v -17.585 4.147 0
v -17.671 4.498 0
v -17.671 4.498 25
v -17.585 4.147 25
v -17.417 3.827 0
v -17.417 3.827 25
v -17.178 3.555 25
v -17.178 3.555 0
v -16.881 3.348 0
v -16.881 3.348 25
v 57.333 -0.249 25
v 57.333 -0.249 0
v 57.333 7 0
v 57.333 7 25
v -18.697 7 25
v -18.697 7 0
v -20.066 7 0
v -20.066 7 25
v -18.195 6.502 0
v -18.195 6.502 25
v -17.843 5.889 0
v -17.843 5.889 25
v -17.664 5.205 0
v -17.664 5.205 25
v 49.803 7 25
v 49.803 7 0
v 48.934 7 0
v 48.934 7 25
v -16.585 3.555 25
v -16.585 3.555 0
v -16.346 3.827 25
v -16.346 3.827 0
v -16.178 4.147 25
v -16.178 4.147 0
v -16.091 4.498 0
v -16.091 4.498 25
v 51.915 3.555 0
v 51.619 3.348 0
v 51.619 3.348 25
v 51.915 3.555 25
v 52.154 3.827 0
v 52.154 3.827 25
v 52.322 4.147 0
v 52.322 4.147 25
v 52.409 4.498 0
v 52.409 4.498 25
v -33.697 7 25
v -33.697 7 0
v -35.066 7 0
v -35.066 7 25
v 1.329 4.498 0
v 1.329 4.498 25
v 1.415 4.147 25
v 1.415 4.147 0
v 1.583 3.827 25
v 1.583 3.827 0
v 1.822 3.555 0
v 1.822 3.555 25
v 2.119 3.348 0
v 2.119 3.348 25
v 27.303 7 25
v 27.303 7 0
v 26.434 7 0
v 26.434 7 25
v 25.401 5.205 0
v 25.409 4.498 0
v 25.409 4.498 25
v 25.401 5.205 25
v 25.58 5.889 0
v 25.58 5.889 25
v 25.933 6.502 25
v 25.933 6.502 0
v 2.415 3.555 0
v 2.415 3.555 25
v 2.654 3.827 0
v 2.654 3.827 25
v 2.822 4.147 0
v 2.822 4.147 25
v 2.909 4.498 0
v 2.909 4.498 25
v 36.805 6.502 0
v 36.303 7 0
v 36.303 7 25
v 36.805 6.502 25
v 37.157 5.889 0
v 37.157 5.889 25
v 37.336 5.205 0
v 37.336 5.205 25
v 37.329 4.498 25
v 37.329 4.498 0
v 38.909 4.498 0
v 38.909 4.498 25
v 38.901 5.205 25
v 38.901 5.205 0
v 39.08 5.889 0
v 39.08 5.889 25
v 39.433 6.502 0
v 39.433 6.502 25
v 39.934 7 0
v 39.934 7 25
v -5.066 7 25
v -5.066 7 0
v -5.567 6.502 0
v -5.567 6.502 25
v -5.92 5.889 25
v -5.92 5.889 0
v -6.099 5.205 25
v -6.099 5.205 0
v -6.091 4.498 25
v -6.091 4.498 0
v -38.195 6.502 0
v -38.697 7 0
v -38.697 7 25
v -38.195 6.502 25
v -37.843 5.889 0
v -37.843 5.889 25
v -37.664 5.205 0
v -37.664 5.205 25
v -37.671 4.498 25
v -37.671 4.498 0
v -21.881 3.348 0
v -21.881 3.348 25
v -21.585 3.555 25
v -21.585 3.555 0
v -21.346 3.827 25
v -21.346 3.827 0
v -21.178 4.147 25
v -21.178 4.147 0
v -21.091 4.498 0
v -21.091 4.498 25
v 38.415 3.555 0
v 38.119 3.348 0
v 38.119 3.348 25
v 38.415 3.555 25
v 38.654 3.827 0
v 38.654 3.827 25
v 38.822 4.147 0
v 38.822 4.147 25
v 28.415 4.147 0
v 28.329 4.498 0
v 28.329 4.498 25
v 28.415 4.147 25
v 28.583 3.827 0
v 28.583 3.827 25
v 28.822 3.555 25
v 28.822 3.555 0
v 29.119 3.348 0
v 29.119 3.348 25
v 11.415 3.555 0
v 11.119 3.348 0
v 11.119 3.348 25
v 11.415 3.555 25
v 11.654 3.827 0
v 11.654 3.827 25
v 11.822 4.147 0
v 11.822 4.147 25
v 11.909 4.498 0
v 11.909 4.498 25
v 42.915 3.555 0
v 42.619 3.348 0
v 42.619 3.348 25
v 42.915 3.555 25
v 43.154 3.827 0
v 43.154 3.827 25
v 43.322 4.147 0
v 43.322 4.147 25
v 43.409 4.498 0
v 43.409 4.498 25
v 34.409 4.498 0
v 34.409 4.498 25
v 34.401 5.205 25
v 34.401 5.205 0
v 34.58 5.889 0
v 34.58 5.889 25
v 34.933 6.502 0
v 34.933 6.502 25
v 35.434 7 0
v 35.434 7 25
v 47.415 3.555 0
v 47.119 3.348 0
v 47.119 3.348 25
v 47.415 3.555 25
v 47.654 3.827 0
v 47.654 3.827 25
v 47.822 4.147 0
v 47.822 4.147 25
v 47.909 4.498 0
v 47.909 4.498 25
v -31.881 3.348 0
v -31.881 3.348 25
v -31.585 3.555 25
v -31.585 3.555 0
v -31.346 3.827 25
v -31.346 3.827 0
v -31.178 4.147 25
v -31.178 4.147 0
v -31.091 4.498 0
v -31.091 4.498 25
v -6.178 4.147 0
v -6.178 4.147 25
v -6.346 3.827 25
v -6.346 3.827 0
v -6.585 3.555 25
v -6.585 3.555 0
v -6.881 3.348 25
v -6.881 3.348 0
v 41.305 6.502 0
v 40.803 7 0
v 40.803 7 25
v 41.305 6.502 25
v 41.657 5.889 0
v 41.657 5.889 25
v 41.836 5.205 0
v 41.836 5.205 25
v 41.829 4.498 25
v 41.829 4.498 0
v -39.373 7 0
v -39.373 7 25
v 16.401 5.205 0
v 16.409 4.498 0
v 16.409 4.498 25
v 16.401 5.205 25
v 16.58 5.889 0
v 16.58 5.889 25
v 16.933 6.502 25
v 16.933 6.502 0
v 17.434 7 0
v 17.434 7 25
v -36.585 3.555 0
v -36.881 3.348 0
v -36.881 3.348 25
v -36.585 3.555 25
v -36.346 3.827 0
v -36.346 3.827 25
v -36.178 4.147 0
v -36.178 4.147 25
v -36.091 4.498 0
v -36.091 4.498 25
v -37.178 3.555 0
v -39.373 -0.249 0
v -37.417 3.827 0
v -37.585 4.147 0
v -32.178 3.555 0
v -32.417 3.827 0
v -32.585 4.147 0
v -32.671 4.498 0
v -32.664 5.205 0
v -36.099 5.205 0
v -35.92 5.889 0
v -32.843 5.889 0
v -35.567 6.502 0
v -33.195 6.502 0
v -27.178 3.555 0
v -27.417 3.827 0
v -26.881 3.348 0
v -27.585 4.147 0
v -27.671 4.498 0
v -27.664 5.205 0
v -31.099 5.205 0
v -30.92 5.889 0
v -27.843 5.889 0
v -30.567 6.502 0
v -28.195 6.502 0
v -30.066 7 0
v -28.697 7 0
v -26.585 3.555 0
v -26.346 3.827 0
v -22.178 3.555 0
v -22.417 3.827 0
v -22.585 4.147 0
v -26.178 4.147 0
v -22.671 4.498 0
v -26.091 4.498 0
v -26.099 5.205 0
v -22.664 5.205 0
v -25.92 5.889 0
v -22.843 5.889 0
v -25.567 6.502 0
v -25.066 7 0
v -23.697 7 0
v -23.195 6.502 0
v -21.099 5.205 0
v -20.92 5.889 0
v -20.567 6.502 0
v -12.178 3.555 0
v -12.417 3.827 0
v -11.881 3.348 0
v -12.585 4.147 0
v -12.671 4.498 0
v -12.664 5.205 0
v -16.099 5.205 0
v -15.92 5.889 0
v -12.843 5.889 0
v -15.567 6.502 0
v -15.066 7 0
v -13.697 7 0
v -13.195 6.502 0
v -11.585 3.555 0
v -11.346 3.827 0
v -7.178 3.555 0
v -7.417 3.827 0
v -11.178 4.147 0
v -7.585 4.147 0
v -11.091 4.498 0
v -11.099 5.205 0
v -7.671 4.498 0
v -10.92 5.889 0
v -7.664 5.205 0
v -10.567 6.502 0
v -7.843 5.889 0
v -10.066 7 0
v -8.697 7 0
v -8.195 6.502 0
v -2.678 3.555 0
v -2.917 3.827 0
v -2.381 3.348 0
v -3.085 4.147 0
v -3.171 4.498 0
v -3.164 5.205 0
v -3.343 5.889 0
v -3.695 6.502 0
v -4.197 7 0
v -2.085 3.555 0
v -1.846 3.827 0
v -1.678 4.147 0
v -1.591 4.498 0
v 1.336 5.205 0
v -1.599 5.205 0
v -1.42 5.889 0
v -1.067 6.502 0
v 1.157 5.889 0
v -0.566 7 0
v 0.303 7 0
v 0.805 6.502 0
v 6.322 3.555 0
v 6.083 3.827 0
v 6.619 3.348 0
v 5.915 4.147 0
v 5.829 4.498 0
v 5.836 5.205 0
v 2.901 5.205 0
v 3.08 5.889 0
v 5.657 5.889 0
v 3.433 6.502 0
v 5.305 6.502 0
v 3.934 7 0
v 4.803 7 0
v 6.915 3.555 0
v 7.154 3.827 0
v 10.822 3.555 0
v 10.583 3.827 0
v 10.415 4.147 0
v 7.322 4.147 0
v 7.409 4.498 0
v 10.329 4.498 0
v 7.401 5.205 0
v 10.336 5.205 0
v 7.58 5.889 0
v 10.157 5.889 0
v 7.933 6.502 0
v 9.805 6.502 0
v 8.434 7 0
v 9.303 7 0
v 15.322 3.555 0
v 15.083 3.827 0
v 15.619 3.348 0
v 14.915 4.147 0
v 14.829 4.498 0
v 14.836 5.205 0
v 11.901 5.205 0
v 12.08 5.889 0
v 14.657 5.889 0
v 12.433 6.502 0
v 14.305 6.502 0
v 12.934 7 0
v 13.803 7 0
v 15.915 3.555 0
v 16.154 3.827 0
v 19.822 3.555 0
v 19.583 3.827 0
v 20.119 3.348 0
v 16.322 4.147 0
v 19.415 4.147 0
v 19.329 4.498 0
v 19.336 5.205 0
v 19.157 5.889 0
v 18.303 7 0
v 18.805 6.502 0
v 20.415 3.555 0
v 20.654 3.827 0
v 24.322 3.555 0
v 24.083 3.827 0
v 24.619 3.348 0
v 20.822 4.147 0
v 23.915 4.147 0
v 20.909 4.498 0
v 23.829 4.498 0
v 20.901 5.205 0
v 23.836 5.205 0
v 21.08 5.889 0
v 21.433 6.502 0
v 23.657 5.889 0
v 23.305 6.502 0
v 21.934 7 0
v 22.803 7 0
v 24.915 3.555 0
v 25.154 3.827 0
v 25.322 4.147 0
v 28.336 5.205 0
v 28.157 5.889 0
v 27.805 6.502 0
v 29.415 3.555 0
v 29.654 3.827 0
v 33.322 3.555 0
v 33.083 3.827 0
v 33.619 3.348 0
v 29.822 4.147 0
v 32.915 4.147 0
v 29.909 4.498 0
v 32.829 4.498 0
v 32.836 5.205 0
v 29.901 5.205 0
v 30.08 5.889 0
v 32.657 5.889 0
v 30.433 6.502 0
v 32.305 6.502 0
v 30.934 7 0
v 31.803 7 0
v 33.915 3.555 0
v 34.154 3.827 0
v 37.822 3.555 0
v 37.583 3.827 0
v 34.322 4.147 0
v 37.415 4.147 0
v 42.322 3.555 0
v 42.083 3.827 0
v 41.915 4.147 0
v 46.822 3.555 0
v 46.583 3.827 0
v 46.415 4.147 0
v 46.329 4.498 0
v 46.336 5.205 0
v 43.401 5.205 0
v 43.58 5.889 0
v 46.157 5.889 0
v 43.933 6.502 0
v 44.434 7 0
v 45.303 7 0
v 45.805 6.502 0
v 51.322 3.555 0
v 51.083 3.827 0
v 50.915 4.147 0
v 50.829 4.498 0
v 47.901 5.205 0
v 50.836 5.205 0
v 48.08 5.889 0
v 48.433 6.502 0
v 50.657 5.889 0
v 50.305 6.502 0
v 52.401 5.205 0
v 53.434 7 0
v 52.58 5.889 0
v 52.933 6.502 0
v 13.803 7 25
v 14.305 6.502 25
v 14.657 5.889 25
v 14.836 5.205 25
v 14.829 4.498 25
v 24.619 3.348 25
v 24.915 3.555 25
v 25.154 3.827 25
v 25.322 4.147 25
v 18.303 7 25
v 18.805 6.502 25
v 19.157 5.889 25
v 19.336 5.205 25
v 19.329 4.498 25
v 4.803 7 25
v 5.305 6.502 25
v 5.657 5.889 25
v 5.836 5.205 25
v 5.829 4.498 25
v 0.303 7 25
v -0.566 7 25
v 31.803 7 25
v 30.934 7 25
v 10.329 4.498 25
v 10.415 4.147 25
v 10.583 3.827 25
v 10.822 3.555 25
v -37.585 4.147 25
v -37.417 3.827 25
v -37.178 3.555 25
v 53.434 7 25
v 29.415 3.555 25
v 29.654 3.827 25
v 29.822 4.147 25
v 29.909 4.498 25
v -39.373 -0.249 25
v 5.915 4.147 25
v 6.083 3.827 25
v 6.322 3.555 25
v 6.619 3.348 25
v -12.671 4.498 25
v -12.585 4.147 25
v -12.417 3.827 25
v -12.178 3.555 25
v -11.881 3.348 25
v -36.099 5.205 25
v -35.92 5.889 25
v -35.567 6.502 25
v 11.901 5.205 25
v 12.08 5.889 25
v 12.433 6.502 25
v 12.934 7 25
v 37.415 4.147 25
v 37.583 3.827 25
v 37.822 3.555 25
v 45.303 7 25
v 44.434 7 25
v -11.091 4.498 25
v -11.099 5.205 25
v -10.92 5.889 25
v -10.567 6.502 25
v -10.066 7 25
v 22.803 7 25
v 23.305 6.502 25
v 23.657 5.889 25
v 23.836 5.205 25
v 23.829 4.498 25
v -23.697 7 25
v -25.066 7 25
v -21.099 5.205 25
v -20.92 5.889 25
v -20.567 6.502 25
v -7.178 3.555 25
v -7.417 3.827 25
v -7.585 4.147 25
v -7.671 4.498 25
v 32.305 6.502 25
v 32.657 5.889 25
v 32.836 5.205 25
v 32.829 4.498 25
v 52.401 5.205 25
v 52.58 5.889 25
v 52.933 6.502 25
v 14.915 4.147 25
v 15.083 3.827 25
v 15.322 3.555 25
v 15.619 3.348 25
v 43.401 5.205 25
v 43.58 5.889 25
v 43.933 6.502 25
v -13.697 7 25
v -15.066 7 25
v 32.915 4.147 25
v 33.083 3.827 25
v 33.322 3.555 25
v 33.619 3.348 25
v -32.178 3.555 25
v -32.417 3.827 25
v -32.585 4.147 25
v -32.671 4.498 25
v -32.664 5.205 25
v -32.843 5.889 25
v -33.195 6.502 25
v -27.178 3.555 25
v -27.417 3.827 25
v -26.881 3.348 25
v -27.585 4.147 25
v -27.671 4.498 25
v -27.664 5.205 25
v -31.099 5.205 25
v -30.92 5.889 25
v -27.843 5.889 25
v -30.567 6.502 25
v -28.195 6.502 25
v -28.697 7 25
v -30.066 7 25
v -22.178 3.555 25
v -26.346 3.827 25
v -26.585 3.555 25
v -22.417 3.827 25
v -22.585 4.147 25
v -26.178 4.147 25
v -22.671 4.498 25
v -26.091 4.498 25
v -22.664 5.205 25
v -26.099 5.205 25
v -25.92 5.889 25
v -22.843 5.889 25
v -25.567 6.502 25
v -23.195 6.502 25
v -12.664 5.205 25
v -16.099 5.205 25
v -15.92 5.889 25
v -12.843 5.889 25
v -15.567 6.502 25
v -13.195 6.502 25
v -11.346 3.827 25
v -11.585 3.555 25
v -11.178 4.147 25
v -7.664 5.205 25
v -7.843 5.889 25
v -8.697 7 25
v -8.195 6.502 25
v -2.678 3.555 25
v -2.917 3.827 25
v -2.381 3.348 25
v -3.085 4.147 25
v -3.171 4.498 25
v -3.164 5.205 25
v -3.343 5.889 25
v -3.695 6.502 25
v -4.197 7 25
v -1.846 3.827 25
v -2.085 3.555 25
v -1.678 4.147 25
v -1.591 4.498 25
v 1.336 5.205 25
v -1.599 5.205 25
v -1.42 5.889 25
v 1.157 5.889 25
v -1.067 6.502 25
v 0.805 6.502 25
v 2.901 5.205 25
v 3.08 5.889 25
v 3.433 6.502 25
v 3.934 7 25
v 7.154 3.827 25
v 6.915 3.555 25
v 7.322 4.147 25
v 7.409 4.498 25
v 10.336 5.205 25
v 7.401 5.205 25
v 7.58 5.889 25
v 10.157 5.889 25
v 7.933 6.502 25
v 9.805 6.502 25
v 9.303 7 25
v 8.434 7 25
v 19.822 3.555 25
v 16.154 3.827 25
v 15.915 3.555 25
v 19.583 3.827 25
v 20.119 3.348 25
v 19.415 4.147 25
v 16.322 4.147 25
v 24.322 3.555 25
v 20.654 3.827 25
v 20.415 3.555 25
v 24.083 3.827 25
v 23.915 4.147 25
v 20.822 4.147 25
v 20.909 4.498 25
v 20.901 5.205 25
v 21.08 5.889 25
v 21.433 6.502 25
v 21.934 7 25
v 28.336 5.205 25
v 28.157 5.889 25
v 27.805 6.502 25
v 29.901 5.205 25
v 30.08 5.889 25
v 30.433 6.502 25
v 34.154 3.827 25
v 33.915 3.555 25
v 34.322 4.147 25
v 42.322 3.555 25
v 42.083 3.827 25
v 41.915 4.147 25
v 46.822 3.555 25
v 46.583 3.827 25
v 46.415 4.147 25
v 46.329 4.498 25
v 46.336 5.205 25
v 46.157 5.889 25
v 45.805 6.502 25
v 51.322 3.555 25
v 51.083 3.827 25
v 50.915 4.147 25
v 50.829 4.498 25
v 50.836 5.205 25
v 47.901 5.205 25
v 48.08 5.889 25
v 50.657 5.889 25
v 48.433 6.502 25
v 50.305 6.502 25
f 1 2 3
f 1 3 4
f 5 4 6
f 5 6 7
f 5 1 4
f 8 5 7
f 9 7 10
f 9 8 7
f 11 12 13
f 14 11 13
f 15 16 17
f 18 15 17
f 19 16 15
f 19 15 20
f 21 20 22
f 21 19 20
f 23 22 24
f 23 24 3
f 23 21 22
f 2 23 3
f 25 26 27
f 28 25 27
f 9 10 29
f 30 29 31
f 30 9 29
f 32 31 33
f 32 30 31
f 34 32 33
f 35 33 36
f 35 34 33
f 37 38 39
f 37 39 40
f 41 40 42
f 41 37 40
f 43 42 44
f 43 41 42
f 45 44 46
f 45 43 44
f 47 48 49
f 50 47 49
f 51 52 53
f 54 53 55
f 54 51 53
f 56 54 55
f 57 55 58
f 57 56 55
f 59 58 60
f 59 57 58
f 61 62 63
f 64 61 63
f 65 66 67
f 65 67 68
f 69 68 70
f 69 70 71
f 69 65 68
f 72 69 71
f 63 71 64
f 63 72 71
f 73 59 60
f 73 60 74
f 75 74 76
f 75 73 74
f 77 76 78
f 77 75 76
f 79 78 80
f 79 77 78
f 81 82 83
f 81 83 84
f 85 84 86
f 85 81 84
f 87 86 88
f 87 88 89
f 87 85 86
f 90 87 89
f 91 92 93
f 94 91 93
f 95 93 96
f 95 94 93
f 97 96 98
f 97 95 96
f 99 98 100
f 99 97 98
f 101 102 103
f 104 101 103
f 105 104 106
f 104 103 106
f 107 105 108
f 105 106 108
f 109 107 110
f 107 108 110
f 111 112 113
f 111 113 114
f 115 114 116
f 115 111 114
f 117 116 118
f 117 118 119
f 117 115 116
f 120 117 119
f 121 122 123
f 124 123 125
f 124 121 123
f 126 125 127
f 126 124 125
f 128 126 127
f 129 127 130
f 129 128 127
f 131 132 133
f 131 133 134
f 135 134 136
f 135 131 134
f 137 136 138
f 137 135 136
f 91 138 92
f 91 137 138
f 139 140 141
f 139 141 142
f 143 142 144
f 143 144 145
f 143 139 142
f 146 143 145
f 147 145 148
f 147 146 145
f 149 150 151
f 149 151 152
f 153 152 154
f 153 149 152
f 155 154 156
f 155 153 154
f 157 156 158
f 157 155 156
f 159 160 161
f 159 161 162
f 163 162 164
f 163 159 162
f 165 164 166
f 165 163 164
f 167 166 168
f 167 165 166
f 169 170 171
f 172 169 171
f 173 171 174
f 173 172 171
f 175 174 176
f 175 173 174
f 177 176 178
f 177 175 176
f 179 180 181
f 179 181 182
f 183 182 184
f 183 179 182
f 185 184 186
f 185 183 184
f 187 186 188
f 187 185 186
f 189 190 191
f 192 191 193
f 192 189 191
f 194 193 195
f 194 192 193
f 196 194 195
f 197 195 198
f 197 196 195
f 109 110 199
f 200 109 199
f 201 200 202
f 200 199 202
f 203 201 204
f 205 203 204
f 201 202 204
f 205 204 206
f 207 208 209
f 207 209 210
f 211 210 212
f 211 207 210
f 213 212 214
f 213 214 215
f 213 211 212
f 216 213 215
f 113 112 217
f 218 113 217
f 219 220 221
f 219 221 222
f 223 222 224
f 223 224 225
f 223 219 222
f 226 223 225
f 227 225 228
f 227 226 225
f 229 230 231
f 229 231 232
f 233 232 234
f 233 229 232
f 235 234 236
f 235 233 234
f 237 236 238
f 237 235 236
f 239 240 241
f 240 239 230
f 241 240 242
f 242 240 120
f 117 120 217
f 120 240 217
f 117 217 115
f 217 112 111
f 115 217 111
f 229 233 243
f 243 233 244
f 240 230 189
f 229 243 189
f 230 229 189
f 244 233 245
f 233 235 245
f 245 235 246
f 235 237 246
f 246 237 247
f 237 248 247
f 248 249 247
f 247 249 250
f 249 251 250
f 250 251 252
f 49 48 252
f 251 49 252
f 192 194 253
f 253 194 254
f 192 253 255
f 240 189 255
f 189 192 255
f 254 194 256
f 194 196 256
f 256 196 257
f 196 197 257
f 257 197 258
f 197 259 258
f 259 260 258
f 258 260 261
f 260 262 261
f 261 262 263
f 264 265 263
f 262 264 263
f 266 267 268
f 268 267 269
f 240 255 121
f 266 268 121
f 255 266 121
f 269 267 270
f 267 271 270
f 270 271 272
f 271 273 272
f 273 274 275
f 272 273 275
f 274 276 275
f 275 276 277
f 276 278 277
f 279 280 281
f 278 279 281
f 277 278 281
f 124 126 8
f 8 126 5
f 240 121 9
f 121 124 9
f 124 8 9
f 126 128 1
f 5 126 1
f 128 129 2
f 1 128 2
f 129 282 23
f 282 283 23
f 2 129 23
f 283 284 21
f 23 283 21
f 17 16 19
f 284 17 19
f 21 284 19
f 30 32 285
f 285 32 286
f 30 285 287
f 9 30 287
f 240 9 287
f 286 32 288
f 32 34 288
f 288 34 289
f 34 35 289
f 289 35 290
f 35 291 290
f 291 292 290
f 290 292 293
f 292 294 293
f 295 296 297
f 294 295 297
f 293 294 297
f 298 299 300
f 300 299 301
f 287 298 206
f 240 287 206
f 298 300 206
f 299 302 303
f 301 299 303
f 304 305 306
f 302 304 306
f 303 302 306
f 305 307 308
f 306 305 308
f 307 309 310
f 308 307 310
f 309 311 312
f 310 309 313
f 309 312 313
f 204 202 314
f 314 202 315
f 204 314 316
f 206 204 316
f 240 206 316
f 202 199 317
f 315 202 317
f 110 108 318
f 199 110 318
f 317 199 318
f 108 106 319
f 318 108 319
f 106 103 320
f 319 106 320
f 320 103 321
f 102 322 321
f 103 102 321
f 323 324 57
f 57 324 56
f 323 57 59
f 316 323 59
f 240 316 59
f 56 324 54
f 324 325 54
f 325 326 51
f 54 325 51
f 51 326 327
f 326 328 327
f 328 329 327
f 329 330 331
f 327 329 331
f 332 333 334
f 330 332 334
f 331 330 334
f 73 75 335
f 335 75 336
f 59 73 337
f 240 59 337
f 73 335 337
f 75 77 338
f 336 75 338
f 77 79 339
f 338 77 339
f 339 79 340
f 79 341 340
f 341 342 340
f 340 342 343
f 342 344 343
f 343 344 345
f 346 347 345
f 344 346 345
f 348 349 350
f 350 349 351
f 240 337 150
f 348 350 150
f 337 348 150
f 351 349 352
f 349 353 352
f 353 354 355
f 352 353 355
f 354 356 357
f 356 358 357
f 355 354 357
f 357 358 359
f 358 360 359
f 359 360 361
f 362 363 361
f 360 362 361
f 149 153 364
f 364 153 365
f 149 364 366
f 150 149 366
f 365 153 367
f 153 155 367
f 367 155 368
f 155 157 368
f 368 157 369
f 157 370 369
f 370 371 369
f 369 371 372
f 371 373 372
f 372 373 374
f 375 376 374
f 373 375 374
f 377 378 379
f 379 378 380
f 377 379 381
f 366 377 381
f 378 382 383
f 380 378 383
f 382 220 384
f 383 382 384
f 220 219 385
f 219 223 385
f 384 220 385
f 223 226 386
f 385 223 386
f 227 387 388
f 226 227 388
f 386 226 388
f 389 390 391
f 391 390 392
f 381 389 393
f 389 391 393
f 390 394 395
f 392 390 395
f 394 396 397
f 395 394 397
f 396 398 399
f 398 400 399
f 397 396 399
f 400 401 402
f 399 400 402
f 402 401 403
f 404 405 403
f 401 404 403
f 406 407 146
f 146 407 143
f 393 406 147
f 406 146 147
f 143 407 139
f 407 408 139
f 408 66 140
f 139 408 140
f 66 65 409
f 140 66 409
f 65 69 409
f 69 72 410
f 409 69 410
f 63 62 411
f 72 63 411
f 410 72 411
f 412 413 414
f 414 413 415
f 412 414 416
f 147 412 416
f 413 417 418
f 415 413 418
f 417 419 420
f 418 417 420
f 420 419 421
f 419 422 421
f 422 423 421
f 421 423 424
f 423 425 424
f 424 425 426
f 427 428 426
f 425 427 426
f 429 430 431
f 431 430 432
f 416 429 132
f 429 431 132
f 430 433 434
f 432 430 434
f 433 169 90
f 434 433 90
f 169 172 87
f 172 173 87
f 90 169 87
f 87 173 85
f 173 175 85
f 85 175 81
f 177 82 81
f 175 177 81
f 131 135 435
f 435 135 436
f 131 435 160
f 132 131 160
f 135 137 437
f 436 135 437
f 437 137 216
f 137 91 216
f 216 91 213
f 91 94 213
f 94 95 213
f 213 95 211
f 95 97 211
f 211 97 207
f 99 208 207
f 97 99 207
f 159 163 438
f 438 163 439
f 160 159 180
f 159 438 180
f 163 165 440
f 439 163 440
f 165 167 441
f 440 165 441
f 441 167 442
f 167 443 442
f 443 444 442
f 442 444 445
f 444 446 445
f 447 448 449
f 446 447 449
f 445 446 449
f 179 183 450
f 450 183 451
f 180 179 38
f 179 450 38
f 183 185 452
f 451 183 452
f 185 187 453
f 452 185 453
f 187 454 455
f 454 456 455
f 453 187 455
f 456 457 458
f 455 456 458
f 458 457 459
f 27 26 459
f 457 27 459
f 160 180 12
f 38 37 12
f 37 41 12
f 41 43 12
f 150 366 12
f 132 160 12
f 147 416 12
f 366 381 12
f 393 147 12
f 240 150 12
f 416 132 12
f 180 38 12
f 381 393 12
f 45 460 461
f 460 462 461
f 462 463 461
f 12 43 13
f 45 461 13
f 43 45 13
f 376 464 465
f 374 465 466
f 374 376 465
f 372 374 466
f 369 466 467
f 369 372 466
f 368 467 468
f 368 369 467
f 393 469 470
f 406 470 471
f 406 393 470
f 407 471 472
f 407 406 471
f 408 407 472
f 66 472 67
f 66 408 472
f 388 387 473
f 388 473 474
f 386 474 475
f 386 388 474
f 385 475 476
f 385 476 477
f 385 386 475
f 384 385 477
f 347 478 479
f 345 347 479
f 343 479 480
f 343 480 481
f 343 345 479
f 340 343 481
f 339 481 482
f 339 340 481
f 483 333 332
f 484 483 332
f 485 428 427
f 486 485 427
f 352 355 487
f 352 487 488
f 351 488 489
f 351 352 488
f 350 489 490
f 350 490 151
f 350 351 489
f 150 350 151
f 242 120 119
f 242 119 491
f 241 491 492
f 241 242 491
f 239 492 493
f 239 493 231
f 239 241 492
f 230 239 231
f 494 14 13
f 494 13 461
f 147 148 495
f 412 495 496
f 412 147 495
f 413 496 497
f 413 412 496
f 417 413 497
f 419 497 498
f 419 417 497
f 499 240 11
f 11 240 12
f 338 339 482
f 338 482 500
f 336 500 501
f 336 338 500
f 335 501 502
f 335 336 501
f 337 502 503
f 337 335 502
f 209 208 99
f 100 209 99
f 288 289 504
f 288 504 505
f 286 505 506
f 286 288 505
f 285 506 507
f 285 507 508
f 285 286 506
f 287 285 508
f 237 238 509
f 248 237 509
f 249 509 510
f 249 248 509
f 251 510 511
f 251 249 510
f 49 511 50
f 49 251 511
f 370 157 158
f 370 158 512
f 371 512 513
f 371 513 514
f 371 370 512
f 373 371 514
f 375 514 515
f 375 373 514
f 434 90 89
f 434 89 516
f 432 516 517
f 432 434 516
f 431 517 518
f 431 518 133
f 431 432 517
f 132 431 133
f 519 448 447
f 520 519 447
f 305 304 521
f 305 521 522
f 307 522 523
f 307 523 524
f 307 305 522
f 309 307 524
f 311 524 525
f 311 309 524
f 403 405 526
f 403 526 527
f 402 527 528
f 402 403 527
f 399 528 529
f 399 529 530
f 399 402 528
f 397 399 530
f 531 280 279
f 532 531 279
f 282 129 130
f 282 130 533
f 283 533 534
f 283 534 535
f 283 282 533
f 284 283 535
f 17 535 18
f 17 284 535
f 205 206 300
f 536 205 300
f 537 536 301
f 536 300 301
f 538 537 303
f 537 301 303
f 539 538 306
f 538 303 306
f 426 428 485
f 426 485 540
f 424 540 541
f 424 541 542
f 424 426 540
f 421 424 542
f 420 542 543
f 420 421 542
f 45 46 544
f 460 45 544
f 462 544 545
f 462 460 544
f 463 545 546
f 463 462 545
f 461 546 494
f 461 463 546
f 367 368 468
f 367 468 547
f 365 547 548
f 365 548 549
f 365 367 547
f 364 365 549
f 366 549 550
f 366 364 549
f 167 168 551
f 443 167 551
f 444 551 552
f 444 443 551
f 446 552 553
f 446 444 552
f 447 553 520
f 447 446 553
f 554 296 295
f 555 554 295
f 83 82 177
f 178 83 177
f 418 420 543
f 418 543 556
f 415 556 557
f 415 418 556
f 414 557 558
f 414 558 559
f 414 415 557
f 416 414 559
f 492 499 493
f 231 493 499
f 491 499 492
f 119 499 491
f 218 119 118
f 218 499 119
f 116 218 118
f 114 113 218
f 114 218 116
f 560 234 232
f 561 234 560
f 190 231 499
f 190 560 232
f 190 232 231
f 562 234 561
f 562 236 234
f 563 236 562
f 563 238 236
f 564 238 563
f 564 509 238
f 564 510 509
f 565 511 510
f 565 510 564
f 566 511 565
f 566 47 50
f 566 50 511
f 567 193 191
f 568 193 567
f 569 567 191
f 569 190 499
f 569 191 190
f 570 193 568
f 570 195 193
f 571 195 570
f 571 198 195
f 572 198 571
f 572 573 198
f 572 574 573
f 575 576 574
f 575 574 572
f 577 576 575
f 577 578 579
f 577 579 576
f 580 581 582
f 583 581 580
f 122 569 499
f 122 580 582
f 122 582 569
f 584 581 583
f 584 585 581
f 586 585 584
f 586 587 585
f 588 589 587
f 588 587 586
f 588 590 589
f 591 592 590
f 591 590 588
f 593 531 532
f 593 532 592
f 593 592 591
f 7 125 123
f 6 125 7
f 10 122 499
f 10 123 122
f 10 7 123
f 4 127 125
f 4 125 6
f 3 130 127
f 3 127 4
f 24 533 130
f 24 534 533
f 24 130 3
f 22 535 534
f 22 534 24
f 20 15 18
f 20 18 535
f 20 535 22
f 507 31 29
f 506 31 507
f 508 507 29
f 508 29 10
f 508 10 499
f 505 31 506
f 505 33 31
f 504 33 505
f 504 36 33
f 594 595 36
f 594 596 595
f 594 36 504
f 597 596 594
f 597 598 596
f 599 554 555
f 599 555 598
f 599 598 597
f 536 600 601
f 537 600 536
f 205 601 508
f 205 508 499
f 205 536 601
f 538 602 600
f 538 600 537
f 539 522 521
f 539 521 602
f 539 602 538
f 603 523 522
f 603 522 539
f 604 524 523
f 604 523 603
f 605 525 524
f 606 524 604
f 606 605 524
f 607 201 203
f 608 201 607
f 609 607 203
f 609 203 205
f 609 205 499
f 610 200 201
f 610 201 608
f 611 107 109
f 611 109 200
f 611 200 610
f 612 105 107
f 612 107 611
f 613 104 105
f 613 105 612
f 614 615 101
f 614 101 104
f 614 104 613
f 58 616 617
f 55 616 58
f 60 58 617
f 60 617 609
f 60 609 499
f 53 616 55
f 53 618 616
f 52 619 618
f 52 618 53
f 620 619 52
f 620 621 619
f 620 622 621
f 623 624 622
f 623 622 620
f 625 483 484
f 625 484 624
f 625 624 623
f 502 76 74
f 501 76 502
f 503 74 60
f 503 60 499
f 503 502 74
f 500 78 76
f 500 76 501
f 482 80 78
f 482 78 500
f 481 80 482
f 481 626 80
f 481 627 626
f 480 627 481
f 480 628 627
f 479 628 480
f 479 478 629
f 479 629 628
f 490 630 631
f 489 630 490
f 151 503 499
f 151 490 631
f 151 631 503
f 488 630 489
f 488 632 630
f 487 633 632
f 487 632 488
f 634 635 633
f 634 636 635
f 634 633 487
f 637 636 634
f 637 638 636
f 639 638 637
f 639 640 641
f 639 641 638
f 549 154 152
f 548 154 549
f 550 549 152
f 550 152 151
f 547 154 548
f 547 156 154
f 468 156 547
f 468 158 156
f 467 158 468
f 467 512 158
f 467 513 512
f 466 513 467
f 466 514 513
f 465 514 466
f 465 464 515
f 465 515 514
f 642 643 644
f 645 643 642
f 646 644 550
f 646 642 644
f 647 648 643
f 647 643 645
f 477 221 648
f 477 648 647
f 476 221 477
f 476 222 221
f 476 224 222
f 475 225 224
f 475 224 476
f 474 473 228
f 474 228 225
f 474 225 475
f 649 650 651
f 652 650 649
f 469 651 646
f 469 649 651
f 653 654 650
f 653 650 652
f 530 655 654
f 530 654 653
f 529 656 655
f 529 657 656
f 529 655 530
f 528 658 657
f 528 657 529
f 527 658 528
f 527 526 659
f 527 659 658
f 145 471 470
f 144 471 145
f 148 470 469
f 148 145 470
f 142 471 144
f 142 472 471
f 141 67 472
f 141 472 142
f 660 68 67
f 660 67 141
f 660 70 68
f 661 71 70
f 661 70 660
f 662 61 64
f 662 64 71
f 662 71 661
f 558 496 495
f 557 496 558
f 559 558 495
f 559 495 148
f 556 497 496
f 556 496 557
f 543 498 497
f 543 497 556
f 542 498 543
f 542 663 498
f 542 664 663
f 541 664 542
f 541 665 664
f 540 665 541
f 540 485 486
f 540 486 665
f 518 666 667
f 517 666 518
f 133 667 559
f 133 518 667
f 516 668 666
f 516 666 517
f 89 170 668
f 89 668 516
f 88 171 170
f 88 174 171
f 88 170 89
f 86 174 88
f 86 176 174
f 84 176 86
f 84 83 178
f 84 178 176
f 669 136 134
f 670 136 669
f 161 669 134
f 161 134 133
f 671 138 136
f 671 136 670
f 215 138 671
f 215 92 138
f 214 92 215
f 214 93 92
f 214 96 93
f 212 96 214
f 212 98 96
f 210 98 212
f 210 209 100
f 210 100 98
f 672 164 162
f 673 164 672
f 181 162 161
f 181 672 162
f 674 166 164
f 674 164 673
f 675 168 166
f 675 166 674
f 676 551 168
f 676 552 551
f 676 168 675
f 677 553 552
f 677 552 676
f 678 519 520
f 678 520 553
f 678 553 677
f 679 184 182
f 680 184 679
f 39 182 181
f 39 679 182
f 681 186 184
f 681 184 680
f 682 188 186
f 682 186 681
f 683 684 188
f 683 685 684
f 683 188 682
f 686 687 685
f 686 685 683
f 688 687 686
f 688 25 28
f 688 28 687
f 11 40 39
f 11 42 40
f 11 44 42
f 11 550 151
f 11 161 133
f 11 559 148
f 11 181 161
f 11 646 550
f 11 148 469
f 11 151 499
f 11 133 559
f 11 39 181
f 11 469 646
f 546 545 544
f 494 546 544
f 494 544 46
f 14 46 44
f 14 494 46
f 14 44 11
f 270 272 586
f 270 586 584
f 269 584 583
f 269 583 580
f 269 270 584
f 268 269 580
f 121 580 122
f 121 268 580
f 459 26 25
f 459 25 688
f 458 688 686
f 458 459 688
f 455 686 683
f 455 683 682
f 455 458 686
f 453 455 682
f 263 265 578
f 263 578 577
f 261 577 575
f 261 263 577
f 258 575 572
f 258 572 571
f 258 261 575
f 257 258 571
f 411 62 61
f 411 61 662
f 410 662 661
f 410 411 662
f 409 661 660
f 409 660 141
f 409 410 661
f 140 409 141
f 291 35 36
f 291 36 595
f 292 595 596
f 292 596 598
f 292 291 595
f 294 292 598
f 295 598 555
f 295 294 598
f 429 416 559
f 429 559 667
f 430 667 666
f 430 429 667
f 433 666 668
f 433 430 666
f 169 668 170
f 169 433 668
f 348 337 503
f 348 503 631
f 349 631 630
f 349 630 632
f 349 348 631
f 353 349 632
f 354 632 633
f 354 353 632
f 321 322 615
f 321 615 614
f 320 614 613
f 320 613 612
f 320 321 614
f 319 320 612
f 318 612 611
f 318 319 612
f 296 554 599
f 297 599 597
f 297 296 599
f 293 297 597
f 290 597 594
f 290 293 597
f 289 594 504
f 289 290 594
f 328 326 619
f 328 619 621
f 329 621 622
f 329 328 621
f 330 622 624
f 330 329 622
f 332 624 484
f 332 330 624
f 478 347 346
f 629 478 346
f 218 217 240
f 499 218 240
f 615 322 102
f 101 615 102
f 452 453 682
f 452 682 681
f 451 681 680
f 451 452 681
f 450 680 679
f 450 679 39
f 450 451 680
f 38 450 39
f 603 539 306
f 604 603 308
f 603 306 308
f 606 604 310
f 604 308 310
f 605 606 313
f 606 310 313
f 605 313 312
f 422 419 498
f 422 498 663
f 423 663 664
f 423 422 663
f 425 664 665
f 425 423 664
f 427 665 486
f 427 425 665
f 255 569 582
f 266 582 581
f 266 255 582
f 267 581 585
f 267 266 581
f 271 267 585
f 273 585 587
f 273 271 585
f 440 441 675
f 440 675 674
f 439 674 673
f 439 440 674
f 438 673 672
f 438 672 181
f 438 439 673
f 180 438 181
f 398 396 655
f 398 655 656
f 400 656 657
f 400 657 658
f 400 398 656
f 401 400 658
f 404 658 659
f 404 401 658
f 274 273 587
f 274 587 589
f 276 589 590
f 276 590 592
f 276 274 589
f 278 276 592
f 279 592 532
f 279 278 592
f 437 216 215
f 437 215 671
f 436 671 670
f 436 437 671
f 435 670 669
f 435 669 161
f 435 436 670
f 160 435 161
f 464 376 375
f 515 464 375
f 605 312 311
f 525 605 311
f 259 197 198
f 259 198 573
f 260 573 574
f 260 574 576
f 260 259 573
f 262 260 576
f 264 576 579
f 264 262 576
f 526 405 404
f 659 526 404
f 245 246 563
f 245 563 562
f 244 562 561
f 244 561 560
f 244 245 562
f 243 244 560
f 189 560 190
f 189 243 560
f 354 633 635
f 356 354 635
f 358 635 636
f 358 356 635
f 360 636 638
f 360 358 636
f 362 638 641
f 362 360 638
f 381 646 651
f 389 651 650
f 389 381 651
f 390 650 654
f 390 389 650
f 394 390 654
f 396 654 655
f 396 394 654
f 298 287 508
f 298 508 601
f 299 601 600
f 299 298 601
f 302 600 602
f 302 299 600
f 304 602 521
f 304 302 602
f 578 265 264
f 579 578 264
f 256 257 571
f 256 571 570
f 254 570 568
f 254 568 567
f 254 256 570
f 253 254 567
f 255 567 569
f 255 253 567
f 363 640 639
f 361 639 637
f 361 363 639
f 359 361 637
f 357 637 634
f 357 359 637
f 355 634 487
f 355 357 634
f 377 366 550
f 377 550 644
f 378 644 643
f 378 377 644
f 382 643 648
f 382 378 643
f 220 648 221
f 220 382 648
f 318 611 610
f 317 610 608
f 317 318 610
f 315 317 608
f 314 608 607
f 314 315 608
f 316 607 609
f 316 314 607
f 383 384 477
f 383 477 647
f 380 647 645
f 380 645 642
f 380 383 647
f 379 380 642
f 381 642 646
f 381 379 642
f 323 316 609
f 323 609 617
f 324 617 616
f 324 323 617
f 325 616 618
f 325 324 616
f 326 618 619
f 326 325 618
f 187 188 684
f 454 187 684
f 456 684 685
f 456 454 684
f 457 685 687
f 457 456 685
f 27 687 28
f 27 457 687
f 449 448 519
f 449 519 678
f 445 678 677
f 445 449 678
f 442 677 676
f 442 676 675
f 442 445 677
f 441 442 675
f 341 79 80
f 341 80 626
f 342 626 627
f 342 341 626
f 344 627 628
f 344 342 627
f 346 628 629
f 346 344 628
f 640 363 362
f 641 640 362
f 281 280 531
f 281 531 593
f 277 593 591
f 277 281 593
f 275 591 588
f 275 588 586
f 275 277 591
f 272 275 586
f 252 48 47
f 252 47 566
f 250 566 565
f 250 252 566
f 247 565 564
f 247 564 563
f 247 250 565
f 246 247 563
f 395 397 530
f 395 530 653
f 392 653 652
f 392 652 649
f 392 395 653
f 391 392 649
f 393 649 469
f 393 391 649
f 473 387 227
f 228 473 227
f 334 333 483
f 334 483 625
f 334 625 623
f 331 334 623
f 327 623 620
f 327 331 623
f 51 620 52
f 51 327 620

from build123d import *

# Parameters (mm, degrees)
BOSS_EXTRUDE1_DEPTH = 25
CUT_EXTRUDE1_DEPTH  = 26.12
LPATTERN1_COUNT     = 10
LPATTERN1_PITCH     = 5
LPATTERN1_COL_COUNT = 14
LPATTERN1_COL_PITCH = 4.5


with BuildPart() as part:
    # Sketch1 → Boss-Extrude1 (new body)
    with BuildSketch(Plane.XY):
        Polygon((28.000000003, 7), (-39.373173928, 7), (-39.373173928, -0.249149017), (0.939234275, -0.249149017), (57.333339072, -0.249149017), (57.333339072, 7), align=None)
    extrude(amount=BOSS_EXTRUDE1_DEPTH)

    # Sketch2 → Cut-Extrude1 (cut)
    with BuildSketch(Plane.XY):
        with BuildLine():
            ThreePointArc((-6.881285782, 3.348371163), (-7.417069895, 3.826658598), (-7.671285782, 4.498371163))
            ThreePointArc((-7.671285782, 4.498371163), (-7.912320341, 6.04482582), (-8.981285782, 7.188037328))
            ThreePointArc((-8.981285782, 7.188037328), (-6.881285782, 7.762283268), (-4.781285782, 7.188037328))
            ThreePointArc((-4.781285782, 7.188037328), (-5.850251222, 6.04482582), (-6.091285782, 4.498371163))
            ThreePointArc((-6.091285782, 4.498371163), (-6.345501668, 3.826658598), (-6.881285782, 3.348371163))
        make_face()
    cut_extrude1 = extrude(amount=CUT_EXTRUDE1_DEPTH, mode=Mode.SUBTRACT)

    # LPattern1: Cut-Extrude1 ×10
    with Locations(*[(-i * LPATTERN1_PITCH, 0, 0) for i in range(1, LPATTERN1_COUNT)]):
        add(cut_extrude1, mode=Mode.SUBTRACT)

    # LPattern1 col: Cut-Extrude1 ×14
    with Locations(*[(i * LPATTERN1_COL_PITCH, 0, 0) for i in range(1, LPATTERN1_COL_COUNT)]):
        add(cut_extrude1, mode=Mode.SUBTRACT)


solid = part.part
